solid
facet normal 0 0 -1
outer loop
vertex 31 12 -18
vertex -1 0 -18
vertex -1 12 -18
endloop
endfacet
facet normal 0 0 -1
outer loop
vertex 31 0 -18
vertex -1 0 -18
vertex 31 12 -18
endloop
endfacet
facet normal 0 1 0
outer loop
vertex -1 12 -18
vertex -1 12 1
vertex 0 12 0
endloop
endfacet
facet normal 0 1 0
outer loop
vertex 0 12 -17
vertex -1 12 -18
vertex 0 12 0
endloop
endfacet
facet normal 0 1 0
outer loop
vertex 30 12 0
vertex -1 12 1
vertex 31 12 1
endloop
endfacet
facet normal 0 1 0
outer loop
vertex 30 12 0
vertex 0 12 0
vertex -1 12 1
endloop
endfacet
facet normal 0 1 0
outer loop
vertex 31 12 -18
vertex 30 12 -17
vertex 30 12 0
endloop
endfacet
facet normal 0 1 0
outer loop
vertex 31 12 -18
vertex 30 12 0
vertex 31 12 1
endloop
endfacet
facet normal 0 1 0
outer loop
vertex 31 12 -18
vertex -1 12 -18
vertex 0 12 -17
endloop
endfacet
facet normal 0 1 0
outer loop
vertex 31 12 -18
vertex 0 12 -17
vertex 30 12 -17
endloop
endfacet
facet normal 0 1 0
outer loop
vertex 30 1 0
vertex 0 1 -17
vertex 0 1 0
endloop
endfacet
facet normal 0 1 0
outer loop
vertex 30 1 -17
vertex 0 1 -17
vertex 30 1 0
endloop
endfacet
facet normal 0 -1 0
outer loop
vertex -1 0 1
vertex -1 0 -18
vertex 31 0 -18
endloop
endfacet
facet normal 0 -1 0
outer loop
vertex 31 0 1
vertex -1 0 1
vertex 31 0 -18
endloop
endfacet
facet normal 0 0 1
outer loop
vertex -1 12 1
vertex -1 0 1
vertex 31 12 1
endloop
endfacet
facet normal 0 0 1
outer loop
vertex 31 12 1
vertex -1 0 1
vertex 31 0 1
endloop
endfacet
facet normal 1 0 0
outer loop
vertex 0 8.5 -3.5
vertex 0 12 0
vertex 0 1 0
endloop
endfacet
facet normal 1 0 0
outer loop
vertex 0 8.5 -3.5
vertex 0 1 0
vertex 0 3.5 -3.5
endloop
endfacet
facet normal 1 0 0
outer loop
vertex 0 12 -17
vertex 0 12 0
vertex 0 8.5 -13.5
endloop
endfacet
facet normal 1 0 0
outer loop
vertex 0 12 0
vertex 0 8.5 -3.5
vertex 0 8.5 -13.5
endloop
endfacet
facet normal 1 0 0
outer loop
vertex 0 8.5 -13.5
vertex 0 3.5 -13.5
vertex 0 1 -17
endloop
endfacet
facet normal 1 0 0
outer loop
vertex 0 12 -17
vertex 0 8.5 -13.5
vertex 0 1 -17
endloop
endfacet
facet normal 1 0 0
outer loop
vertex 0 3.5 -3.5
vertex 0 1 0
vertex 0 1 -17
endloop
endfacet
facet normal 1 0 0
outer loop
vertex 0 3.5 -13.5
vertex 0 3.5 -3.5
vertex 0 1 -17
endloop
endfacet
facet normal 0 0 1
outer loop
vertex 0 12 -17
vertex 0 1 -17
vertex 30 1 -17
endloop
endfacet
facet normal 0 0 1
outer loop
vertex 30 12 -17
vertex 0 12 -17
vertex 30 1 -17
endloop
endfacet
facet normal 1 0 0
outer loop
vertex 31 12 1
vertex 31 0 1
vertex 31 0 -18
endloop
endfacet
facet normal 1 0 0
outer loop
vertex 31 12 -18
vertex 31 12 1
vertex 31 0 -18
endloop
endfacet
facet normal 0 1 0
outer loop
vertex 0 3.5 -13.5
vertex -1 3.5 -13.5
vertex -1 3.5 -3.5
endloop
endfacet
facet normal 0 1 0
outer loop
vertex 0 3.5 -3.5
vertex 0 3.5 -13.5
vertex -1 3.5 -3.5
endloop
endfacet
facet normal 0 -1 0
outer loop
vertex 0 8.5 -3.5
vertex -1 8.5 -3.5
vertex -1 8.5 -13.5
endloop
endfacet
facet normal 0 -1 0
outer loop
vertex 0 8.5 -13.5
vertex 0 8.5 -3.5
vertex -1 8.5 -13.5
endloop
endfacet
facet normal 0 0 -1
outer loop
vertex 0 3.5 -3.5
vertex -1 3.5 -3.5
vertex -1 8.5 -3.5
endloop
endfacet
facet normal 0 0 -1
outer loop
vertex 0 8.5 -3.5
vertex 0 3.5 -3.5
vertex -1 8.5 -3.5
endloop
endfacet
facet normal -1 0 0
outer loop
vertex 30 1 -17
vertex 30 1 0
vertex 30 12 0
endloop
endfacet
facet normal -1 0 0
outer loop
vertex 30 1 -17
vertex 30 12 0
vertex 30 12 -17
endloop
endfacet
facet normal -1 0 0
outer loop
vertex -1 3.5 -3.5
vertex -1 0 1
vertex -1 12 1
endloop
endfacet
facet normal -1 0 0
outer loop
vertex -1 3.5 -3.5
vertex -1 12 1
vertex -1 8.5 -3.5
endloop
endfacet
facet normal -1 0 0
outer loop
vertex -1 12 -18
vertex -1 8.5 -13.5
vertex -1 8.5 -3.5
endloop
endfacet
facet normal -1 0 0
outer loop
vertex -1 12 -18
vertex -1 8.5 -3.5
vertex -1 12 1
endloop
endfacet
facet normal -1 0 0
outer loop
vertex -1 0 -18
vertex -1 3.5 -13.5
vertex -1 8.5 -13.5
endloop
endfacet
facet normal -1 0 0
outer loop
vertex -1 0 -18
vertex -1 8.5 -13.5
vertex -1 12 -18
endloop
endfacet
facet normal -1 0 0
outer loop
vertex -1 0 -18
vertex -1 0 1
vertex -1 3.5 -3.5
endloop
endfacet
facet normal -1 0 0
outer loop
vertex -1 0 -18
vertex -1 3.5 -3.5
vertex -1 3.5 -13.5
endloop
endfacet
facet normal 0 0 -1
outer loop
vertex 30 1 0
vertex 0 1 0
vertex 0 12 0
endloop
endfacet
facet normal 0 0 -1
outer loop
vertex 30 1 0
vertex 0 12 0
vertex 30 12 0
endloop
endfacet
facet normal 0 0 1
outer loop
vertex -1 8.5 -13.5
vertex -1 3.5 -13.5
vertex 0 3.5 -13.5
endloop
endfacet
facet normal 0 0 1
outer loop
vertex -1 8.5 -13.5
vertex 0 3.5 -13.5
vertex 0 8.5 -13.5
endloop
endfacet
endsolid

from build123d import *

# Parameters (mm, degrees)
CROQUIS1_W              = 32
CROQUIS1_H              = 19
CROQUIS1_W_2            = 30
CROQUIS1_H_2            = 17
SALIENTE_EXTRUIR1_DEPTH = 12
CROQUIS1_3_W            = 30
CROQUIS1_3_H            = 17
SALIENTE_EXTRUIR2_DEPTH = 1
CROQUIS2_W              = 10
CROQUIS2_H              = 5
CORTAR_EXTRUIR1_DEPTH   = 1


with BuildPart() as part:
    # Croquis1 → Saliente-Extruir1 (new body)
    with BuildSketch(Plane(origin=(0, 0, 0), x_dir=(1, 0, 0), z_dir=(0, 1, 0))):
        with Locations((15, 8.5)):
            Rectangle(CROQUIS1_W, CROQUIS1_H)
        with Locations((15, 8.5)):
            Rectangle(CROQUIS1_W_2, CROQUIS1_H_2, mode=Mode.SUBTRACT)
    extrude(amount=SALIENTE_EXTRUIR1_DEPTH)

    # Croquis1<3> → Saliente-Extruir2 (add)
    with BuildSketch(Plane(origin=(0, 0, 0), x_dir=(1, 0, 0), z_dir=(0, 1, 0))):
        with Locations((15, 8.5)):
            Rectangle(CROQUIS1_3_W, CROQUIS1_3_H)
    extrude(amount=SALIENTE_EXTRUIR2_DEPTH)

    # Croquis2 → Cortar-Extruir1 (cut)
    with BuildSketch(Plane.ZY.offset(1)):
        with Locations((-8.5, 6)):
            Rectangle(CROQUIS2_W, CROQUIS2_H)
    extrude(amount=-CORTAR_EXTRUIR1_DEPTH, mode=Mode.SUBTRACT)


solid = part.part
